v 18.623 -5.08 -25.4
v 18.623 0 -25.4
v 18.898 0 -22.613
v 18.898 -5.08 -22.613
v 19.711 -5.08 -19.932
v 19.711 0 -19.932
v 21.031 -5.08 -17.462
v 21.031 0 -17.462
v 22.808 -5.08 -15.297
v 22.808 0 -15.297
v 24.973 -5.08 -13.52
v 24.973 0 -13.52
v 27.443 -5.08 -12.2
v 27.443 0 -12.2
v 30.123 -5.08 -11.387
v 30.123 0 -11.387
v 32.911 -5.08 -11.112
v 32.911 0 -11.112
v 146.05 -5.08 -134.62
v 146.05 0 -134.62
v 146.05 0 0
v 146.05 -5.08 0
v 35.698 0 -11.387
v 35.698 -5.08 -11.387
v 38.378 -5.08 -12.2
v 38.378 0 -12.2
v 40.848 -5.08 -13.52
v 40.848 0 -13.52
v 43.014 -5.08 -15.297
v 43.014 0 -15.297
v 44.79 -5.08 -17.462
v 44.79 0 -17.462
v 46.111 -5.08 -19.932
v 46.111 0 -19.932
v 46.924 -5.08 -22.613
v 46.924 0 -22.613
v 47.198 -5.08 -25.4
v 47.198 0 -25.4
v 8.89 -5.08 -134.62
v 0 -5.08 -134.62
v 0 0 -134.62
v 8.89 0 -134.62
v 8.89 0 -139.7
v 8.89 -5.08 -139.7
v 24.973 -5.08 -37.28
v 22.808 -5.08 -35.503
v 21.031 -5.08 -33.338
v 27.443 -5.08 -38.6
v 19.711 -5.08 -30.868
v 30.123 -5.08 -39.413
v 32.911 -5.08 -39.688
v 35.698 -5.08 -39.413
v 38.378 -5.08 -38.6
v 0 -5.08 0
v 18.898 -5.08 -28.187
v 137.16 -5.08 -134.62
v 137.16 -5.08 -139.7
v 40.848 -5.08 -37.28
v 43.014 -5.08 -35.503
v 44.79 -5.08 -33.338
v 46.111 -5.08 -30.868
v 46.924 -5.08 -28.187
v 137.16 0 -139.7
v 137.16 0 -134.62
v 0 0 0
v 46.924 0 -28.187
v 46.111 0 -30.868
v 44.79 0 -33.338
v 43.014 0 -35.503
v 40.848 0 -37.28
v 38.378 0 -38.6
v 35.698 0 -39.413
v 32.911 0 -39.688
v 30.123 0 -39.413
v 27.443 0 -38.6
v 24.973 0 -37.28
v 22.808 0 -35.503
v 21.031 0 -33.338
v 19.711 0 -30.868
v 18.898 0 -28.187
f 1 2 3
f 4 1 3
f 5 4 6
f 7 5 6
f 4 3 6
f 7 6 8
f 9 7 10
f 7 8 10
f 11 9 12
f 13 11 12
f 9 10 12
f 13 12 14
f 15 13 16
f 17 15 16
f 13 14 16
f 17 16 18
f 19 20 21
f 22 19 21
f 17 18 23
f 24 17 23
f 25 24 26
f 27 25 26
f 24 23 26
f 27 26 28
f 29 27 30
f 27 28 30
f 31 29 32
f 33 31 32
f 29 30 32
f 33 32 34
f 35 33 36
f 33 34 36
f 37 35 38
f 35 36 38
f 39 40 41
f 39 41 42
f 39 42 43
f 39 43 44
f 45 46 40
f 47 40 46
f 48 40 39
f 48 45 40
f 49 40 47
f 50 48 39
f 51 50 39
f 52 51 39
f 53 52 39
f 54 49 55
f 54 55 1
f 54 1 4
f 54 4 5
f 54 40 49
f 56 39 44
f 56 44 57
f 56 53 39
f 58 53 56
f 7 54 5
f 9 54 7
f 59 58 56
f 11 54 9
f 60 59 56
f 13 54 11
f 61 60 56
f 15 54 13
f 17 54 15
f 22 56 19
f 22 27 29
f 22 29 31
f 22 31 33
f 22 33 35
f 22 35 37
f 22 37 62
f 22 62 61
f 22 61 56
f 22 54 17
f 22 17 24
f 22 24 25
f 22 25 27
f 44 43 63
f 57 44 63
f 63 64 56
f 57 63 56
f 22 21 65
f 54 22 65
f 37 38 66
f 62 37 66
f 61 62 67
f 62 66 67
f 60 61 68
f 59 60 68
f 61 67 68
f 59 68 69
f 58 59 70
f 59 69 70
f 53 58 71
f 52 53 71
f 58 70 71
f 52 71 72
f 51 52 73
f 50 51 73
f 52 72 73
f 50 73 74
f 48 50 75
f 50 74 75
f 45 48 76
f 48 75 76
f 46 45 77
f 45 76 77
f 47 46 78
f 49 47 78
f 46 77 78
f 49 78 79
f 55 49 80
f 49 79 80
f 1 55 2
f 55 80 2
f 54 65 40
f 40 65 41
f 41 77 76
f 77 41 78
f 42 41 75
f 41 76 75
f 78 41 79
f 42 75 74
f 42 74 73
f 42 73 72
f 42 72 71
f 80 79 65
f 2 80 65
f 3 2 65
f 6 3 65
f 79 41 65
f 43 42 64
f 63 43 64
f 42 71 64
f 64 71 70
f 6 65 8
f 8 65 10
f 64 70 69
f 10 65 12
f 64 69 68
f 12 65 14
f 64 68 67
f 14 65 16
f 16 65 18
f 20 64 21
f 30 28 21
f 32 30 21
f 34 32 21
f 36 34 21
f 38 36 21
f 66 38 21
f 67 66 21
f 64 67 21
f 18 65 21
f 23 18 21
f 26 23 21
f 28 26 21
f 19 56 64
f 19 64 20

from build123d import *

# Parameters (mm, degrees)
F1_DEPTH = 5.08
F2_W     = 8.89
F2_H     = 5.08
F3_DEPTH = 5.08


with BuildPart() as f1:
    # F0 (on Front) → F1 (new body)
    with BuildSketch(Plane.XZ):
        with BuildLine():
            Line((146.05, 0), (32.91078, 0))
            Line((32.91078, 0), (32.91078, -11.1125))
            ThreePointArc((32.91078, -11.1125), (43.013568, -15.297212), (47.19828, -25.4))
            ThreePointArc((47.19828, -25.4), (32.91078, -39.6875), (18.62328, -25.4))
            Line((18.62328, -25.4), (0, -25.4))
            Line((0, -25.4), (0, -139.7))
            Line((0, -139.7), (146.05, -139.7))
            Line((146.05, -139.7), (146.05, 0))
        make_face()
        with BuildLine():
            Line((32.91078, 0), (0, 0))
            Line((0, 0), (0, -25.4))
            Line((0, -25.4), (18.62328, -25.4))
            ThreePointArc((18.62328, -25.4), (22.807992, -15.297212), (32.91078, -11.1125))
            Line((32.91078, -11.1125), (32.91078, 0))
        make_face()
    extrude(amount=F1_DEPTH)

    # F2 (on face) → F3 (cut)
    with BuildSketch(Plane(origin=(0, 0, -139.7), x_dir=(1, 0, 0), z_dir=(0, 0, -1))):
        with Locations((4.445, 2.54)):
            Rectangle(F2_W, F2_H)
        with Locations((141.605, 2.54)):
            Rectangle(F2_W, F2_H)
    extrude(amount=-F3_DEPTH, mode=Mode.SUBTRACT)


solid = f1.part
